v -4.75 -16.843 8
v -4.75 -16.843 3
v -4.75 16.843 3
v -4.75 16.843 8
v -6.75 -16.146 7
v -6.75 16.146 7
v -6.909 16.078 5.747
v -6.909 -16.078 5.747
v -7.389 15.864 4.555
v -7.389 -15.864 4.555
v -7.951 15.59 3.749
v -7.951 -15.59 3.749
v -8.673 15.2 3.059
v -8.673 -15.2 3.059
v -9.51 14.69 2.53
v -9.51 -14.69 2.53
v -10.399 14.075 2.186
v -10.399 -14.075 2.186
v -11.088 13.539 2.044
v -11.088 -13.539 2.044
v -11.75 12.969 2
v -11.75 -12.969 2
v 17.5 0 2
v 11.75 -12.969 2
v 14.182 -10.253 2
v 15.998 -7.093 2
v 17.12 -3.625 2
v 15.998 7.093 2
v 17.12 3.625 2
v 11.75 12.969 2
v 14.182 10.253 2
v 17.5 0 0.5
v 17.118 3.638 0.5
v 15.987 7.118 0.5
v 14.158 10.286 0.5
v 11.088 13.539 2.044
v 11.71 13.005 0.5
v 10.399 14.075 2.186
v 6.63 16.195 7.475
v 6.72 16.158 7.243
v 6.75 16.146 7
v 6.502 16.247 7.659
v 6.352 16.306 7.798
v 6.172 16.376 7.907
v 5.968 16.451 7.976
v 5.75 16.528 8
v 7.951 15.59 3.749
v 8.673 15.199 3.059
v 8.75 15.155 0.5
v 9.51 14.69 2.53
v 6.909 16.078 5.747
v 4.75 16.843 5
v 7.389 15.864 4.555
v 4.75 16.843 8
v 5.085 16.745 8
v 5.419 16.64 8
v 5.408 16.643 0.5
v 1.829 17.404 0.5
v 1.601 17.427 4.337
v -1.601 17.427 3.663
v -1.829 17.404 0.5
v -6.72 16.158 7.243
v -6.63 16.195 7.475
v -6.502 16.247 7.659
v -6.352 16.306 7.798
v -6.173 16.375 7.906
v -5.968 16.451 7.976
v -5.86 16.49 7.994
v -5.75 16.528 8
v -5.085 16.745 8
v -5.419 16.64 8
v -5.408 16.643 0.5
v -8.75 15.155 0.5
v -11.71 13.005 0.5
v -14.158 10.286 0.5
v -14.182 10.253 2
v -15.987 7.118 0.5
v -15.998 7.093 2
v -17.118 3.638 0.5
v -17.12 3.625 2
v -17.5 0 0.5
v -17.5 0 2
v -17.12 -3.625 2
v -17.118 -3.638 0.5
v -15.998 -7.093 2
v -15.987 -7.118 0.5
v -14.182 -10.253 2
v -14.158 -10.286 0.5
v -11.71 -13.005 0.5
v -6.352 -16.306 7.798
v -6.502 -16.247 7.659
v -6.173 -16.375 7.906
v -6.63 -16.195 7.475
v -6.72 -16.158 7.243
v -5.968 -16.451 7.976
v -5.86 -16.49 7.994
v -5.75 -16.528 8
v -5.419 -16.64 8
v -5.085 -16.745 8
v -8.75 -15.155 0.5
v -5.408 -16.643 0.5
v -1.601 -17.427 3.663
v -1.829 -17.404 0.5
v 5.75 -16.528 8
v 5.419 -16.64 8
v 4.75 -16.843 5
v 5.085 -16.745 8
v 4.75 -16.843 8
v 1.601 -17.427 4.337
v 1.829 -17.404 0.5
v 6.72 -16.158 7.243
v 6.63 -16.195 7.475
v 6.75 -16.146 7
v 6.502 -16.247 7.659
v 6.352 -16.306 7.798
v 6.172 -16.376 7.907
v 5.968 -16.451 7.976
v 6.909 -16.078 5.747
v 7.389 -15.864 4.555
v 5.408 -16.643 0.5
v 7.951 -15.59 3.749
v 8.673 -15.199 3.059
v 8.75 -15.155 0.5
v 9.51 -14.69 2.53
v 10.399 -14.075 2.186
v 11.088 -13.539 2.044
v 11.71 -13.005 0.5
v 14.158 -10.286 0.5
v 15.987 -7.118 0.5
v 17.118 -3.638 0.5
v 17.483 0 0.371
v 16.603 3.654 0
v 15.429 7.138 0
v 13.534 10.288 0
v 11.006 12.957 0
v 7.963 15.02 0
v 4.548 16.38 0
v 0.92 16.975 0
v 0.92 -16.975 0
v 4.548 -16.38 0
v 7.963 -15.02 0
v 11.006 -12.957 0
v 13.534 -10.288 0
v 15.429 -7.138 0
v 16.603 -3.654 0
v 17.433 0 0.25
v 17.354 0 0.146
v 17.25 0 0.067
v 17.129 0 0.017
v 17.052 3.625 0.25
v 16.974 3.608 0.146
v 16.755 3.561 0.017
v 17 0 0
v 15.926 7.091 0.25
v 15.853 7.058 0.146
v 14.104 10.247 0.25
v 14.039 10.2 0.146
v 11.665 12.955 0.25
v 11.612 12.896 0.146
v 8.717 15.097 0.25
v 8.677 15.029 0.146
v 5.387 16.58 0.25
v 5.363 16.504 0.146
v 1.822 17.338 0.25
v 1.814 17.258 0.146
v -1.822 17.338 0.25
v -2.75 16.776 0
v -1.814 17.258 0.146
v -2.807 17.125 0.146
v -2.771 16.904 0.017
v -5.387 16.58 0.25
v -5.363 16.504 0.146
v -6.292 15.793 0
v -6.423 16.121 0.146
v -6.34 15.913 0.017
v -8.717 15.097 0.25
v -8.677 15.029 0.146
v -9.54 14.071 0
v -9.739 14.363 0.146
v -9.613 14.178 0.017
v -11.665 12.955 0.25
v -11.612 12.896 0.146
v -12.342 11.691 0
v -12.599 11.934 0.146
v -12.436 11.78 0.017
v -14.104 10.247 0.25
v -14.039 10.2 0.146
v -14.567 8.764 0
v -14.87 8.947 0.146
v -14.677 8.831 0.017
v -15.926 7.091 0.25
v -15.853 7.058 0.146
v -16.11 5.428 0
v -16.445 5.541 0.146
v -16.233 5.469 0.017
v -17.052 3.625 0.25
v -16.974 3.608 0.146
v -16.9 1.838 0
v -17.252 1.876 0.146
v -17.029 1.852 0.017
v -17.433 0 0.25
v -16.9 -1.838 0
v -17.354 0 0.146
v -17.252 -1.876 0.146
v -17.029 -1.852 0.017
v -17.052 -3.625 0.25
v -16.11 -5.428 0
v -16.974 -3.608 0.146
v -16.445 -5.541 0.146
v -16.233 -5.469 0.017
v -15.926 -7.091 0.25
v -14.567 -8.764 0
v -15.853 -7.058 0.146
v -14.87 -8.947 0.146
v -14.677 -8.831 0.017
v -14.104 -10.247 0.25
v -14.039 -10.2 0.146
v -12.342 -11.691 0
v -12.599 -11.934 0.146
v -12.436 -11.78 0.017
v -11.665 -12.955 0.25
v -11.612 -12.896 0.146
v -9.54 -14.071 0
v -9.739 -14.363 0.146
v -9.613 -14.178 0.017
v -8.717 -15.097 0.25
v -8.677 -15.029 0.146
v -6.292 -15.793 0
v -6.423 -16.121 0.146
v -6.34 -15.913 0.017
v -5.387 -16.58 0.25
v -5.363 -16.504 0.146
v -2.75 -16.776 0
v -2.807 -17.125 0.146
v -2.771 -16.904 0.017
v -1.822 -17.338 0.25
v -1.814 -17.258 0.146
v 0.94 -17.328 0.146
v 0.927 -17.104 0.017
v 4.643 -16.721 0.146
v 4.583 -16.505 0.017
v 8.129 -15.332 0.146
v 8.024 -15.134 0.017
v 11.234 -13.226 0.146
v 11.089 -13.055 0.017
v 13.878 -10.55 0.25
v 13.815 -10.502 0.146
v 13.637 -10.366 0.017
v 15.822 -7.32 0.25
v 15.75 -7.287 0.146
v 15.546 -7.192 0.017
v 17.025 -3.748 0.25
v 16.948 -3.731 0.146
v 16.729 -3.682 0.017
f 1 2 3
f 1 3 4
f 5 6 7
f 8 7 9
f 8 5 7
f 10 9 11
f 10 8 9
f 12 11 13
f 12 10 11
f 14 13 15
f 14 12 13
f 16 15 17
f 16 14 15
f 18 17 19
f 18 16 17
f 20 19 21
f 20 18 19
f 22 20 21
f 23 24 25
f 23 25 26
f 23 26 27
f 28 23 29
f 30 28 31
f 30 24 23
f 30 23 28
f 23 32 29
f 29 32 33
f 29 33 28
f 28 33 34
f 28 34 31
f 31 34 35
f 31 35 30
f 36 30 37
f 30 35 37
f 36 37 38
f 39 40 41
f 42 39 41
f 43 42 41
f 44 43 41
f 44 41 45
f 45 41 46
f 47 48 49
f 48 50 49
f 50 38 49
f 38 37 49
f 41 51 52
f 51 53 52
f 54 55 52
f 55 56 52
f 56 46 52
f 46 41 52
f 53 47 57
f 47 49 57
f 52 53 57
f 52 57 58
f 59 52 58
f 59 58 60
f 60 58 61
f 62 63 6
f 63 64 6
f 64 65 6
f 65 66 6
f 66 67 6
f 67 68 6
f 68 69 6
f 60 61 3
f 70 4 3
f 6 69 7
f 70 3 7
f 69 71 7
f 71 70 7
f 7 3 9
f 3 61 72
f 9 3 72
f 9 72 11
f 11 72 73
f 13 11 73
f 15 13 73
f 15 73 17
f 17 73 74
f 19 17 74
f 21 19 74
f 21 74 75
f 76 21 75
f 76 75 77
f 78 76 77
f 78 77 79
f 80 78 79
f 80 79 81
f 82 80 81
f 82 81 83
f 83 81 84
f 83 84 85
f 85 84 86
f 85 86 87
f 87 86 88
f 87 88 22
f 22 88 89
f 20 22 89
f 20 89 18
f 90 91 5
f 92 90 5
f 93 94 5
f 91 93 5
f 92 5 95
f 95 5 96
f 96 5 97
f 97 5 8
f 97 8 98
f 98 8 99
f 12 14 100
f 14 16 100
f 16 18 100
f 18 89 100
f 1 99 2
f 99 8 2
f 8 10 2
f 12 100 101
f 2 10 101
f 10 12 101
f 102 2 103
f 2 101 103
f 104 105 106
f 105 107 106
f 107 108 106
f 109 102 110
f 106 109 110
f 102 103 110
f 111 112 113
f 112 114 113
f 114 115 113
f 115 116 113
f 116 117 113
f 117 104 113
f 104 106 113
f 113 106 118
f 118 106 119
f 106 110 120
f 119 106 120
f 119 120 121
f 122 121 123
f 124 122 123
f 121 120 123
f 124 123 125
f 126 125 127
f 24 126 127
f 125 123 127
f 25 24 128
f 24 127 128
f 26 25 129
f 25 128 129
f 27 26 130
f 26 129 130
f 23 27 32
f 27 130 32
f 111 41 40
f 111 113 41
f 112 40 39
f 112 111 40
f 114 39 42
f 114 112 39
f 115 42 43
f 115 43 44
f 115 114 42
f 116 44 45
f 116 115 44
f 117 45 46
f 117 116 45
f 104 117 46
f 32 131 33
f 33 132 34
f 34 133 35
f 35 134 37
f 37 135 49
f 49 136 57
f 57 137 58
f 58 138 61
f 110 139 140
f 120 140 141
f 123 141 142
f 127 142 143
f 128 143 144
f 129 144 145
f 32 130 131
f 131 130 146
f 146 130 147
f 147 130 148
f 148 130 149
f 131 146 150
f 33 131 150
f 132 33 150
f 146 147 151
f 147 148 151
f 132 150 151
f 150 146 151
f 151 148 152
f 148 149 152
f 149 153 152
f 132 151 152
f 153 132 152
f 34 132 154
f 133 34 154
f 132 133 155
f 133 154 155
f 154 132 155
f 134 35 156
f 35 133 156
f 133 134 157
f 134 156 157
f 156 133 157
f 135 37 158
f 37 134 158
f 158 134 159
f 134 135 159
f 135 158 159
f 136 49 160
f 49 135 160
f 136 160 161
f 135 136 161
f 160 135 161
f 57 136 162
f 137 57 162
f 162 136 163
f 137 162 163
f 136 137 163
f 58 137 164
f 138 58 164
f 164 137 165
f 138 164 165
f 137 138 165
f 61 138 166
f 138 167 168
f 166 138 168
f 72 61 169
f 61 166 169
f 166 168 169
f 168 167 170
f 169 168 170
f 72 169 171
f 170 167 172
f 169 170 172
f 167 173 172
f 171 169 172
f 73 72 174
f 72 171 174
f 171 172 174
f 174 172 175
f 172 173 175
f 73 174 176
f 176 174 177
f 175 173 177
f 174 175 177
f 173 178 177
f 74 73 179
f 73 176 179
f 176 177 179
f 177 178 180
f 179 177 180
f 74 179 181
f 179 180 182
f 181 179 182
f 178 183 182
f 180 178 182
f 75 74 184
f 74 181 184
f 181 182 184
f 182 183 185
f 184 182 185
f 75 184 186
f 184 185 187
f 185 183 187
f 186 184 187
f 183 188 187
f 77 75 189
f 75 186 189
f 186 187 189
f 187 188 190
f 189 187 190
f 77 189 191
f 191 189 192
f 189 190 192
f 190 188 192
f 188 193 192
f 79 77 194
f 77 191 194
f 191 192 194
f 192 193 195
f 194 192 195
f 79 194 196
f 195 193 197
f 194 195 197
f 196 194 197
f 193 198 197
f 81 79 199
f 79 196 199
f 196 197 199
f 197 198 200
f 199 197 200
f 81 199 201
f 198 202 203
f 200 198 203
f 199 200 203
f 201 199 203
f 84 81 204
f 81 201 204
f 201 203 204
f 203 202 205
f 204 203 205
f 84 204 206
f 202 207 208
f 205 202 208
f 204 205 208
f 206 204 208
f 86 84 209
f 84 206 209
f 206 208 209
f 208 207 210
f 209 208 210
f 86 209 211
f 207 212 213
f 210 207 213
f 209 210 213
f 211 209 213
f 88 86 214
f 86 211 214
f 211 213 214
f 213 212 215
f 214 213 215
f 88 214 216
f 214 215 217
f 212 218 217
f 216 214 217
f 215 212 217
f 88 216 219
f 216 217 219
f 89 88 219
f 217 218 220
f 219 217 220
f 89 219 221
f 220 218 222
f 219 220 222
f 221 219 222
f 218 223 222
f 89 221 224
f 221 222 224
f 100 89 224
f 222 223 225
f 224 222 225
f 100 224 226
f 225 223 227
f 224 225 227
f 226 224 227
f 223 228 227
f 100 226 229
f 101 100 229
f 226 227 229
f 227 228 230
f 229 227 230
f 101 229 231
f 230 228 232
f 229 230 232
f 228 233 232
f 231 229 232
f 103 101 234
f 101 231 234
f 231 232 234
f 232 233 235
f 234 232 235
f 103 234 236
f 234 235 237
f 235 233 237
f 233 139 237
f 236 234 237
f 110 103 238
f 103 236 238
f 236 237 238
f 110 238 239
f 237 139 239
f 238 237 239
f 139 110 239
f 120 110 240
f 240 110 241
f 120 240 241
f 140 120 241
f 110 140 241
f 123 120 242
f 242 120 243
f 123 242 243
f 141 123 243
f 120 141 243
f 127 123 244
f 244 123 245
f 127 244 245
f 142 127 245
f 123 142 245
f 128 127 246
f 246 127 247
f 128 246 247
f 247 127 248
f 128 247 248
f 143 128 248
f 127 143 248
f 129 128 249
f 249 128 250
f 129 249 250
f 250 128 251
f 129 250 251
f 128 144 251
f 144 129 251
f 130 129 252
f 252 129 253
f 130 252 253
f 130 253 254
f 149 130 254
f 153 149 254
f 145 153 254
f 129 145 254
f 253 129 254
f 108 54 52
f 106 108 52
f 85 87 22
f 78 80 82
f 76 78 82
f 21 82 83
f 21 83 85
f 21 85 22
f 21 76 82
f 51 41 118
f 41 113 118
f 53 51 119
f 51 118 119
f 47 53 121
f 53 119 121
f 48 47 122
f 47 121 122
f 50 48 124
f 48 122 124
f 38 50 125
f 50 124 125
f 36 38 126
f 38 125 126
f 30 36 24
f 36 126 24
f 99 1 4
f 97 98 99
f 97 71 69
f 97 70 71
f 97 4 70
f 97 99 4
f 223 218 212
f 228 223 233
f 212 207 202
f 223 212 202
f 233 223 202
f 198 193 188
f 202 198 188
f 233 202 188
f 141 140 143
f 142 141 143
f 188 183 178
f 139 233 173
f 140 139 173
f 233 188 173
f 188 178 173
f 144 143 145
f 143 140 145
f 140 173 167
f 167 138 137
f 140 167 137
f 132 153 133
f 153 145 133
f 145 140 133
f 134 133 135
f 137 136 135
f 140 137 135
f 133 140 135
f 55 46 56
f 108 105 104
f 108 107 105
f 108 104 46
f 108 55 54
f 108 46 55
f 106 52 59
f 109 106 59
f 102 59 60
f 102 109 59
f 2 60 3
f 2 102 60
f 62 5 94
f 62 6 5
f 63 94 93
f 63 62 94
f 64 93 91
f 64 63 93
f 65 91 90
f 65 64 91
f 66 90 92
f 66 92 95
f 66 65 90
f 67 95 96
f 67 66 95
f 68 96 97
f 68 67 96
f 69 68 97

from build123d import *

# Parameters (mm, degrees)
F0_R     = 17.5
F1_DEPTH = 2
F3_DEPTH = 20
F4_DEPTH = 6.001
F5_DEPTH = 6.001
F6_R     = 5
F7_R     = 0.99999
F8_R     = 0.5


# Not quite as in the source:
# - a fillet or chamfer is up to 0.001 mm smaller than in the source, because OpenCascade refuses the exact size


with BuildPart() as f1:
    # F0 (on Top) → F1 (new body)
    with BuildSketch(Plane.XY):
        Circle(F0_R)
    extrude(amount=F1_DEPTH)

    # F2 (on Front) → F3 (join, symmetric)
    with BuildSketch(Plane.XZ):
        Polygon((-6.75, 8), (-6.75, 2), (6.75, 2), (6.75, 8), (4.75, 8), (4.75, 5), (-4.75, 3), (-4.75, 8), align=None)
    extrude(amount=F3_DEPTH, both=True)

    # F4 (cut, through all): a face of the model
    f4_faces = [f1.faces().sort_by_distance(p)[0] for p in [
        (0, -18.5005607704, 2),
    ]]
    extrude(f4_faces, amount=-F4_DEPTH, mode=Mode.SUBTRACT)

    # F5 (cut, through all): a face of the model
    f5_faces = [f1.faces().sort_by_distance(p)[0] for p in [
        (0, 18.5005607704, 2),
    ]]
    extrude(f5_faces, amount=-F5_DEPTH, mode=Mode.SUBTRACT)

    # F6
    f6_edges = [f1.edges().sort_by_distance(p)[0] for p in [
        (-6.75, 0, 2),
        (6.75, 0, 2),
    ]]
    fillet(f6_edges, radius=F6_R)

    # F7 (radius 1 in the source; OpenCascade refuses exactly that, so slightly less here)
    f7_edges = [f1.edges().sort_by_distance(p)[0] for p in [
        (-6.75, 0, 8),
        (6.75, 0, 8),
    ]]
    fillet(f7_edges, radius=F7_R)

    # F8
    f8_edges = [f1.edges().sort_by_distance(p)[0] for p in [
        (-17.5, 0, 0),
    ]]
    fillet(f8_edges, radius=F8_R)


solid = f1.part
